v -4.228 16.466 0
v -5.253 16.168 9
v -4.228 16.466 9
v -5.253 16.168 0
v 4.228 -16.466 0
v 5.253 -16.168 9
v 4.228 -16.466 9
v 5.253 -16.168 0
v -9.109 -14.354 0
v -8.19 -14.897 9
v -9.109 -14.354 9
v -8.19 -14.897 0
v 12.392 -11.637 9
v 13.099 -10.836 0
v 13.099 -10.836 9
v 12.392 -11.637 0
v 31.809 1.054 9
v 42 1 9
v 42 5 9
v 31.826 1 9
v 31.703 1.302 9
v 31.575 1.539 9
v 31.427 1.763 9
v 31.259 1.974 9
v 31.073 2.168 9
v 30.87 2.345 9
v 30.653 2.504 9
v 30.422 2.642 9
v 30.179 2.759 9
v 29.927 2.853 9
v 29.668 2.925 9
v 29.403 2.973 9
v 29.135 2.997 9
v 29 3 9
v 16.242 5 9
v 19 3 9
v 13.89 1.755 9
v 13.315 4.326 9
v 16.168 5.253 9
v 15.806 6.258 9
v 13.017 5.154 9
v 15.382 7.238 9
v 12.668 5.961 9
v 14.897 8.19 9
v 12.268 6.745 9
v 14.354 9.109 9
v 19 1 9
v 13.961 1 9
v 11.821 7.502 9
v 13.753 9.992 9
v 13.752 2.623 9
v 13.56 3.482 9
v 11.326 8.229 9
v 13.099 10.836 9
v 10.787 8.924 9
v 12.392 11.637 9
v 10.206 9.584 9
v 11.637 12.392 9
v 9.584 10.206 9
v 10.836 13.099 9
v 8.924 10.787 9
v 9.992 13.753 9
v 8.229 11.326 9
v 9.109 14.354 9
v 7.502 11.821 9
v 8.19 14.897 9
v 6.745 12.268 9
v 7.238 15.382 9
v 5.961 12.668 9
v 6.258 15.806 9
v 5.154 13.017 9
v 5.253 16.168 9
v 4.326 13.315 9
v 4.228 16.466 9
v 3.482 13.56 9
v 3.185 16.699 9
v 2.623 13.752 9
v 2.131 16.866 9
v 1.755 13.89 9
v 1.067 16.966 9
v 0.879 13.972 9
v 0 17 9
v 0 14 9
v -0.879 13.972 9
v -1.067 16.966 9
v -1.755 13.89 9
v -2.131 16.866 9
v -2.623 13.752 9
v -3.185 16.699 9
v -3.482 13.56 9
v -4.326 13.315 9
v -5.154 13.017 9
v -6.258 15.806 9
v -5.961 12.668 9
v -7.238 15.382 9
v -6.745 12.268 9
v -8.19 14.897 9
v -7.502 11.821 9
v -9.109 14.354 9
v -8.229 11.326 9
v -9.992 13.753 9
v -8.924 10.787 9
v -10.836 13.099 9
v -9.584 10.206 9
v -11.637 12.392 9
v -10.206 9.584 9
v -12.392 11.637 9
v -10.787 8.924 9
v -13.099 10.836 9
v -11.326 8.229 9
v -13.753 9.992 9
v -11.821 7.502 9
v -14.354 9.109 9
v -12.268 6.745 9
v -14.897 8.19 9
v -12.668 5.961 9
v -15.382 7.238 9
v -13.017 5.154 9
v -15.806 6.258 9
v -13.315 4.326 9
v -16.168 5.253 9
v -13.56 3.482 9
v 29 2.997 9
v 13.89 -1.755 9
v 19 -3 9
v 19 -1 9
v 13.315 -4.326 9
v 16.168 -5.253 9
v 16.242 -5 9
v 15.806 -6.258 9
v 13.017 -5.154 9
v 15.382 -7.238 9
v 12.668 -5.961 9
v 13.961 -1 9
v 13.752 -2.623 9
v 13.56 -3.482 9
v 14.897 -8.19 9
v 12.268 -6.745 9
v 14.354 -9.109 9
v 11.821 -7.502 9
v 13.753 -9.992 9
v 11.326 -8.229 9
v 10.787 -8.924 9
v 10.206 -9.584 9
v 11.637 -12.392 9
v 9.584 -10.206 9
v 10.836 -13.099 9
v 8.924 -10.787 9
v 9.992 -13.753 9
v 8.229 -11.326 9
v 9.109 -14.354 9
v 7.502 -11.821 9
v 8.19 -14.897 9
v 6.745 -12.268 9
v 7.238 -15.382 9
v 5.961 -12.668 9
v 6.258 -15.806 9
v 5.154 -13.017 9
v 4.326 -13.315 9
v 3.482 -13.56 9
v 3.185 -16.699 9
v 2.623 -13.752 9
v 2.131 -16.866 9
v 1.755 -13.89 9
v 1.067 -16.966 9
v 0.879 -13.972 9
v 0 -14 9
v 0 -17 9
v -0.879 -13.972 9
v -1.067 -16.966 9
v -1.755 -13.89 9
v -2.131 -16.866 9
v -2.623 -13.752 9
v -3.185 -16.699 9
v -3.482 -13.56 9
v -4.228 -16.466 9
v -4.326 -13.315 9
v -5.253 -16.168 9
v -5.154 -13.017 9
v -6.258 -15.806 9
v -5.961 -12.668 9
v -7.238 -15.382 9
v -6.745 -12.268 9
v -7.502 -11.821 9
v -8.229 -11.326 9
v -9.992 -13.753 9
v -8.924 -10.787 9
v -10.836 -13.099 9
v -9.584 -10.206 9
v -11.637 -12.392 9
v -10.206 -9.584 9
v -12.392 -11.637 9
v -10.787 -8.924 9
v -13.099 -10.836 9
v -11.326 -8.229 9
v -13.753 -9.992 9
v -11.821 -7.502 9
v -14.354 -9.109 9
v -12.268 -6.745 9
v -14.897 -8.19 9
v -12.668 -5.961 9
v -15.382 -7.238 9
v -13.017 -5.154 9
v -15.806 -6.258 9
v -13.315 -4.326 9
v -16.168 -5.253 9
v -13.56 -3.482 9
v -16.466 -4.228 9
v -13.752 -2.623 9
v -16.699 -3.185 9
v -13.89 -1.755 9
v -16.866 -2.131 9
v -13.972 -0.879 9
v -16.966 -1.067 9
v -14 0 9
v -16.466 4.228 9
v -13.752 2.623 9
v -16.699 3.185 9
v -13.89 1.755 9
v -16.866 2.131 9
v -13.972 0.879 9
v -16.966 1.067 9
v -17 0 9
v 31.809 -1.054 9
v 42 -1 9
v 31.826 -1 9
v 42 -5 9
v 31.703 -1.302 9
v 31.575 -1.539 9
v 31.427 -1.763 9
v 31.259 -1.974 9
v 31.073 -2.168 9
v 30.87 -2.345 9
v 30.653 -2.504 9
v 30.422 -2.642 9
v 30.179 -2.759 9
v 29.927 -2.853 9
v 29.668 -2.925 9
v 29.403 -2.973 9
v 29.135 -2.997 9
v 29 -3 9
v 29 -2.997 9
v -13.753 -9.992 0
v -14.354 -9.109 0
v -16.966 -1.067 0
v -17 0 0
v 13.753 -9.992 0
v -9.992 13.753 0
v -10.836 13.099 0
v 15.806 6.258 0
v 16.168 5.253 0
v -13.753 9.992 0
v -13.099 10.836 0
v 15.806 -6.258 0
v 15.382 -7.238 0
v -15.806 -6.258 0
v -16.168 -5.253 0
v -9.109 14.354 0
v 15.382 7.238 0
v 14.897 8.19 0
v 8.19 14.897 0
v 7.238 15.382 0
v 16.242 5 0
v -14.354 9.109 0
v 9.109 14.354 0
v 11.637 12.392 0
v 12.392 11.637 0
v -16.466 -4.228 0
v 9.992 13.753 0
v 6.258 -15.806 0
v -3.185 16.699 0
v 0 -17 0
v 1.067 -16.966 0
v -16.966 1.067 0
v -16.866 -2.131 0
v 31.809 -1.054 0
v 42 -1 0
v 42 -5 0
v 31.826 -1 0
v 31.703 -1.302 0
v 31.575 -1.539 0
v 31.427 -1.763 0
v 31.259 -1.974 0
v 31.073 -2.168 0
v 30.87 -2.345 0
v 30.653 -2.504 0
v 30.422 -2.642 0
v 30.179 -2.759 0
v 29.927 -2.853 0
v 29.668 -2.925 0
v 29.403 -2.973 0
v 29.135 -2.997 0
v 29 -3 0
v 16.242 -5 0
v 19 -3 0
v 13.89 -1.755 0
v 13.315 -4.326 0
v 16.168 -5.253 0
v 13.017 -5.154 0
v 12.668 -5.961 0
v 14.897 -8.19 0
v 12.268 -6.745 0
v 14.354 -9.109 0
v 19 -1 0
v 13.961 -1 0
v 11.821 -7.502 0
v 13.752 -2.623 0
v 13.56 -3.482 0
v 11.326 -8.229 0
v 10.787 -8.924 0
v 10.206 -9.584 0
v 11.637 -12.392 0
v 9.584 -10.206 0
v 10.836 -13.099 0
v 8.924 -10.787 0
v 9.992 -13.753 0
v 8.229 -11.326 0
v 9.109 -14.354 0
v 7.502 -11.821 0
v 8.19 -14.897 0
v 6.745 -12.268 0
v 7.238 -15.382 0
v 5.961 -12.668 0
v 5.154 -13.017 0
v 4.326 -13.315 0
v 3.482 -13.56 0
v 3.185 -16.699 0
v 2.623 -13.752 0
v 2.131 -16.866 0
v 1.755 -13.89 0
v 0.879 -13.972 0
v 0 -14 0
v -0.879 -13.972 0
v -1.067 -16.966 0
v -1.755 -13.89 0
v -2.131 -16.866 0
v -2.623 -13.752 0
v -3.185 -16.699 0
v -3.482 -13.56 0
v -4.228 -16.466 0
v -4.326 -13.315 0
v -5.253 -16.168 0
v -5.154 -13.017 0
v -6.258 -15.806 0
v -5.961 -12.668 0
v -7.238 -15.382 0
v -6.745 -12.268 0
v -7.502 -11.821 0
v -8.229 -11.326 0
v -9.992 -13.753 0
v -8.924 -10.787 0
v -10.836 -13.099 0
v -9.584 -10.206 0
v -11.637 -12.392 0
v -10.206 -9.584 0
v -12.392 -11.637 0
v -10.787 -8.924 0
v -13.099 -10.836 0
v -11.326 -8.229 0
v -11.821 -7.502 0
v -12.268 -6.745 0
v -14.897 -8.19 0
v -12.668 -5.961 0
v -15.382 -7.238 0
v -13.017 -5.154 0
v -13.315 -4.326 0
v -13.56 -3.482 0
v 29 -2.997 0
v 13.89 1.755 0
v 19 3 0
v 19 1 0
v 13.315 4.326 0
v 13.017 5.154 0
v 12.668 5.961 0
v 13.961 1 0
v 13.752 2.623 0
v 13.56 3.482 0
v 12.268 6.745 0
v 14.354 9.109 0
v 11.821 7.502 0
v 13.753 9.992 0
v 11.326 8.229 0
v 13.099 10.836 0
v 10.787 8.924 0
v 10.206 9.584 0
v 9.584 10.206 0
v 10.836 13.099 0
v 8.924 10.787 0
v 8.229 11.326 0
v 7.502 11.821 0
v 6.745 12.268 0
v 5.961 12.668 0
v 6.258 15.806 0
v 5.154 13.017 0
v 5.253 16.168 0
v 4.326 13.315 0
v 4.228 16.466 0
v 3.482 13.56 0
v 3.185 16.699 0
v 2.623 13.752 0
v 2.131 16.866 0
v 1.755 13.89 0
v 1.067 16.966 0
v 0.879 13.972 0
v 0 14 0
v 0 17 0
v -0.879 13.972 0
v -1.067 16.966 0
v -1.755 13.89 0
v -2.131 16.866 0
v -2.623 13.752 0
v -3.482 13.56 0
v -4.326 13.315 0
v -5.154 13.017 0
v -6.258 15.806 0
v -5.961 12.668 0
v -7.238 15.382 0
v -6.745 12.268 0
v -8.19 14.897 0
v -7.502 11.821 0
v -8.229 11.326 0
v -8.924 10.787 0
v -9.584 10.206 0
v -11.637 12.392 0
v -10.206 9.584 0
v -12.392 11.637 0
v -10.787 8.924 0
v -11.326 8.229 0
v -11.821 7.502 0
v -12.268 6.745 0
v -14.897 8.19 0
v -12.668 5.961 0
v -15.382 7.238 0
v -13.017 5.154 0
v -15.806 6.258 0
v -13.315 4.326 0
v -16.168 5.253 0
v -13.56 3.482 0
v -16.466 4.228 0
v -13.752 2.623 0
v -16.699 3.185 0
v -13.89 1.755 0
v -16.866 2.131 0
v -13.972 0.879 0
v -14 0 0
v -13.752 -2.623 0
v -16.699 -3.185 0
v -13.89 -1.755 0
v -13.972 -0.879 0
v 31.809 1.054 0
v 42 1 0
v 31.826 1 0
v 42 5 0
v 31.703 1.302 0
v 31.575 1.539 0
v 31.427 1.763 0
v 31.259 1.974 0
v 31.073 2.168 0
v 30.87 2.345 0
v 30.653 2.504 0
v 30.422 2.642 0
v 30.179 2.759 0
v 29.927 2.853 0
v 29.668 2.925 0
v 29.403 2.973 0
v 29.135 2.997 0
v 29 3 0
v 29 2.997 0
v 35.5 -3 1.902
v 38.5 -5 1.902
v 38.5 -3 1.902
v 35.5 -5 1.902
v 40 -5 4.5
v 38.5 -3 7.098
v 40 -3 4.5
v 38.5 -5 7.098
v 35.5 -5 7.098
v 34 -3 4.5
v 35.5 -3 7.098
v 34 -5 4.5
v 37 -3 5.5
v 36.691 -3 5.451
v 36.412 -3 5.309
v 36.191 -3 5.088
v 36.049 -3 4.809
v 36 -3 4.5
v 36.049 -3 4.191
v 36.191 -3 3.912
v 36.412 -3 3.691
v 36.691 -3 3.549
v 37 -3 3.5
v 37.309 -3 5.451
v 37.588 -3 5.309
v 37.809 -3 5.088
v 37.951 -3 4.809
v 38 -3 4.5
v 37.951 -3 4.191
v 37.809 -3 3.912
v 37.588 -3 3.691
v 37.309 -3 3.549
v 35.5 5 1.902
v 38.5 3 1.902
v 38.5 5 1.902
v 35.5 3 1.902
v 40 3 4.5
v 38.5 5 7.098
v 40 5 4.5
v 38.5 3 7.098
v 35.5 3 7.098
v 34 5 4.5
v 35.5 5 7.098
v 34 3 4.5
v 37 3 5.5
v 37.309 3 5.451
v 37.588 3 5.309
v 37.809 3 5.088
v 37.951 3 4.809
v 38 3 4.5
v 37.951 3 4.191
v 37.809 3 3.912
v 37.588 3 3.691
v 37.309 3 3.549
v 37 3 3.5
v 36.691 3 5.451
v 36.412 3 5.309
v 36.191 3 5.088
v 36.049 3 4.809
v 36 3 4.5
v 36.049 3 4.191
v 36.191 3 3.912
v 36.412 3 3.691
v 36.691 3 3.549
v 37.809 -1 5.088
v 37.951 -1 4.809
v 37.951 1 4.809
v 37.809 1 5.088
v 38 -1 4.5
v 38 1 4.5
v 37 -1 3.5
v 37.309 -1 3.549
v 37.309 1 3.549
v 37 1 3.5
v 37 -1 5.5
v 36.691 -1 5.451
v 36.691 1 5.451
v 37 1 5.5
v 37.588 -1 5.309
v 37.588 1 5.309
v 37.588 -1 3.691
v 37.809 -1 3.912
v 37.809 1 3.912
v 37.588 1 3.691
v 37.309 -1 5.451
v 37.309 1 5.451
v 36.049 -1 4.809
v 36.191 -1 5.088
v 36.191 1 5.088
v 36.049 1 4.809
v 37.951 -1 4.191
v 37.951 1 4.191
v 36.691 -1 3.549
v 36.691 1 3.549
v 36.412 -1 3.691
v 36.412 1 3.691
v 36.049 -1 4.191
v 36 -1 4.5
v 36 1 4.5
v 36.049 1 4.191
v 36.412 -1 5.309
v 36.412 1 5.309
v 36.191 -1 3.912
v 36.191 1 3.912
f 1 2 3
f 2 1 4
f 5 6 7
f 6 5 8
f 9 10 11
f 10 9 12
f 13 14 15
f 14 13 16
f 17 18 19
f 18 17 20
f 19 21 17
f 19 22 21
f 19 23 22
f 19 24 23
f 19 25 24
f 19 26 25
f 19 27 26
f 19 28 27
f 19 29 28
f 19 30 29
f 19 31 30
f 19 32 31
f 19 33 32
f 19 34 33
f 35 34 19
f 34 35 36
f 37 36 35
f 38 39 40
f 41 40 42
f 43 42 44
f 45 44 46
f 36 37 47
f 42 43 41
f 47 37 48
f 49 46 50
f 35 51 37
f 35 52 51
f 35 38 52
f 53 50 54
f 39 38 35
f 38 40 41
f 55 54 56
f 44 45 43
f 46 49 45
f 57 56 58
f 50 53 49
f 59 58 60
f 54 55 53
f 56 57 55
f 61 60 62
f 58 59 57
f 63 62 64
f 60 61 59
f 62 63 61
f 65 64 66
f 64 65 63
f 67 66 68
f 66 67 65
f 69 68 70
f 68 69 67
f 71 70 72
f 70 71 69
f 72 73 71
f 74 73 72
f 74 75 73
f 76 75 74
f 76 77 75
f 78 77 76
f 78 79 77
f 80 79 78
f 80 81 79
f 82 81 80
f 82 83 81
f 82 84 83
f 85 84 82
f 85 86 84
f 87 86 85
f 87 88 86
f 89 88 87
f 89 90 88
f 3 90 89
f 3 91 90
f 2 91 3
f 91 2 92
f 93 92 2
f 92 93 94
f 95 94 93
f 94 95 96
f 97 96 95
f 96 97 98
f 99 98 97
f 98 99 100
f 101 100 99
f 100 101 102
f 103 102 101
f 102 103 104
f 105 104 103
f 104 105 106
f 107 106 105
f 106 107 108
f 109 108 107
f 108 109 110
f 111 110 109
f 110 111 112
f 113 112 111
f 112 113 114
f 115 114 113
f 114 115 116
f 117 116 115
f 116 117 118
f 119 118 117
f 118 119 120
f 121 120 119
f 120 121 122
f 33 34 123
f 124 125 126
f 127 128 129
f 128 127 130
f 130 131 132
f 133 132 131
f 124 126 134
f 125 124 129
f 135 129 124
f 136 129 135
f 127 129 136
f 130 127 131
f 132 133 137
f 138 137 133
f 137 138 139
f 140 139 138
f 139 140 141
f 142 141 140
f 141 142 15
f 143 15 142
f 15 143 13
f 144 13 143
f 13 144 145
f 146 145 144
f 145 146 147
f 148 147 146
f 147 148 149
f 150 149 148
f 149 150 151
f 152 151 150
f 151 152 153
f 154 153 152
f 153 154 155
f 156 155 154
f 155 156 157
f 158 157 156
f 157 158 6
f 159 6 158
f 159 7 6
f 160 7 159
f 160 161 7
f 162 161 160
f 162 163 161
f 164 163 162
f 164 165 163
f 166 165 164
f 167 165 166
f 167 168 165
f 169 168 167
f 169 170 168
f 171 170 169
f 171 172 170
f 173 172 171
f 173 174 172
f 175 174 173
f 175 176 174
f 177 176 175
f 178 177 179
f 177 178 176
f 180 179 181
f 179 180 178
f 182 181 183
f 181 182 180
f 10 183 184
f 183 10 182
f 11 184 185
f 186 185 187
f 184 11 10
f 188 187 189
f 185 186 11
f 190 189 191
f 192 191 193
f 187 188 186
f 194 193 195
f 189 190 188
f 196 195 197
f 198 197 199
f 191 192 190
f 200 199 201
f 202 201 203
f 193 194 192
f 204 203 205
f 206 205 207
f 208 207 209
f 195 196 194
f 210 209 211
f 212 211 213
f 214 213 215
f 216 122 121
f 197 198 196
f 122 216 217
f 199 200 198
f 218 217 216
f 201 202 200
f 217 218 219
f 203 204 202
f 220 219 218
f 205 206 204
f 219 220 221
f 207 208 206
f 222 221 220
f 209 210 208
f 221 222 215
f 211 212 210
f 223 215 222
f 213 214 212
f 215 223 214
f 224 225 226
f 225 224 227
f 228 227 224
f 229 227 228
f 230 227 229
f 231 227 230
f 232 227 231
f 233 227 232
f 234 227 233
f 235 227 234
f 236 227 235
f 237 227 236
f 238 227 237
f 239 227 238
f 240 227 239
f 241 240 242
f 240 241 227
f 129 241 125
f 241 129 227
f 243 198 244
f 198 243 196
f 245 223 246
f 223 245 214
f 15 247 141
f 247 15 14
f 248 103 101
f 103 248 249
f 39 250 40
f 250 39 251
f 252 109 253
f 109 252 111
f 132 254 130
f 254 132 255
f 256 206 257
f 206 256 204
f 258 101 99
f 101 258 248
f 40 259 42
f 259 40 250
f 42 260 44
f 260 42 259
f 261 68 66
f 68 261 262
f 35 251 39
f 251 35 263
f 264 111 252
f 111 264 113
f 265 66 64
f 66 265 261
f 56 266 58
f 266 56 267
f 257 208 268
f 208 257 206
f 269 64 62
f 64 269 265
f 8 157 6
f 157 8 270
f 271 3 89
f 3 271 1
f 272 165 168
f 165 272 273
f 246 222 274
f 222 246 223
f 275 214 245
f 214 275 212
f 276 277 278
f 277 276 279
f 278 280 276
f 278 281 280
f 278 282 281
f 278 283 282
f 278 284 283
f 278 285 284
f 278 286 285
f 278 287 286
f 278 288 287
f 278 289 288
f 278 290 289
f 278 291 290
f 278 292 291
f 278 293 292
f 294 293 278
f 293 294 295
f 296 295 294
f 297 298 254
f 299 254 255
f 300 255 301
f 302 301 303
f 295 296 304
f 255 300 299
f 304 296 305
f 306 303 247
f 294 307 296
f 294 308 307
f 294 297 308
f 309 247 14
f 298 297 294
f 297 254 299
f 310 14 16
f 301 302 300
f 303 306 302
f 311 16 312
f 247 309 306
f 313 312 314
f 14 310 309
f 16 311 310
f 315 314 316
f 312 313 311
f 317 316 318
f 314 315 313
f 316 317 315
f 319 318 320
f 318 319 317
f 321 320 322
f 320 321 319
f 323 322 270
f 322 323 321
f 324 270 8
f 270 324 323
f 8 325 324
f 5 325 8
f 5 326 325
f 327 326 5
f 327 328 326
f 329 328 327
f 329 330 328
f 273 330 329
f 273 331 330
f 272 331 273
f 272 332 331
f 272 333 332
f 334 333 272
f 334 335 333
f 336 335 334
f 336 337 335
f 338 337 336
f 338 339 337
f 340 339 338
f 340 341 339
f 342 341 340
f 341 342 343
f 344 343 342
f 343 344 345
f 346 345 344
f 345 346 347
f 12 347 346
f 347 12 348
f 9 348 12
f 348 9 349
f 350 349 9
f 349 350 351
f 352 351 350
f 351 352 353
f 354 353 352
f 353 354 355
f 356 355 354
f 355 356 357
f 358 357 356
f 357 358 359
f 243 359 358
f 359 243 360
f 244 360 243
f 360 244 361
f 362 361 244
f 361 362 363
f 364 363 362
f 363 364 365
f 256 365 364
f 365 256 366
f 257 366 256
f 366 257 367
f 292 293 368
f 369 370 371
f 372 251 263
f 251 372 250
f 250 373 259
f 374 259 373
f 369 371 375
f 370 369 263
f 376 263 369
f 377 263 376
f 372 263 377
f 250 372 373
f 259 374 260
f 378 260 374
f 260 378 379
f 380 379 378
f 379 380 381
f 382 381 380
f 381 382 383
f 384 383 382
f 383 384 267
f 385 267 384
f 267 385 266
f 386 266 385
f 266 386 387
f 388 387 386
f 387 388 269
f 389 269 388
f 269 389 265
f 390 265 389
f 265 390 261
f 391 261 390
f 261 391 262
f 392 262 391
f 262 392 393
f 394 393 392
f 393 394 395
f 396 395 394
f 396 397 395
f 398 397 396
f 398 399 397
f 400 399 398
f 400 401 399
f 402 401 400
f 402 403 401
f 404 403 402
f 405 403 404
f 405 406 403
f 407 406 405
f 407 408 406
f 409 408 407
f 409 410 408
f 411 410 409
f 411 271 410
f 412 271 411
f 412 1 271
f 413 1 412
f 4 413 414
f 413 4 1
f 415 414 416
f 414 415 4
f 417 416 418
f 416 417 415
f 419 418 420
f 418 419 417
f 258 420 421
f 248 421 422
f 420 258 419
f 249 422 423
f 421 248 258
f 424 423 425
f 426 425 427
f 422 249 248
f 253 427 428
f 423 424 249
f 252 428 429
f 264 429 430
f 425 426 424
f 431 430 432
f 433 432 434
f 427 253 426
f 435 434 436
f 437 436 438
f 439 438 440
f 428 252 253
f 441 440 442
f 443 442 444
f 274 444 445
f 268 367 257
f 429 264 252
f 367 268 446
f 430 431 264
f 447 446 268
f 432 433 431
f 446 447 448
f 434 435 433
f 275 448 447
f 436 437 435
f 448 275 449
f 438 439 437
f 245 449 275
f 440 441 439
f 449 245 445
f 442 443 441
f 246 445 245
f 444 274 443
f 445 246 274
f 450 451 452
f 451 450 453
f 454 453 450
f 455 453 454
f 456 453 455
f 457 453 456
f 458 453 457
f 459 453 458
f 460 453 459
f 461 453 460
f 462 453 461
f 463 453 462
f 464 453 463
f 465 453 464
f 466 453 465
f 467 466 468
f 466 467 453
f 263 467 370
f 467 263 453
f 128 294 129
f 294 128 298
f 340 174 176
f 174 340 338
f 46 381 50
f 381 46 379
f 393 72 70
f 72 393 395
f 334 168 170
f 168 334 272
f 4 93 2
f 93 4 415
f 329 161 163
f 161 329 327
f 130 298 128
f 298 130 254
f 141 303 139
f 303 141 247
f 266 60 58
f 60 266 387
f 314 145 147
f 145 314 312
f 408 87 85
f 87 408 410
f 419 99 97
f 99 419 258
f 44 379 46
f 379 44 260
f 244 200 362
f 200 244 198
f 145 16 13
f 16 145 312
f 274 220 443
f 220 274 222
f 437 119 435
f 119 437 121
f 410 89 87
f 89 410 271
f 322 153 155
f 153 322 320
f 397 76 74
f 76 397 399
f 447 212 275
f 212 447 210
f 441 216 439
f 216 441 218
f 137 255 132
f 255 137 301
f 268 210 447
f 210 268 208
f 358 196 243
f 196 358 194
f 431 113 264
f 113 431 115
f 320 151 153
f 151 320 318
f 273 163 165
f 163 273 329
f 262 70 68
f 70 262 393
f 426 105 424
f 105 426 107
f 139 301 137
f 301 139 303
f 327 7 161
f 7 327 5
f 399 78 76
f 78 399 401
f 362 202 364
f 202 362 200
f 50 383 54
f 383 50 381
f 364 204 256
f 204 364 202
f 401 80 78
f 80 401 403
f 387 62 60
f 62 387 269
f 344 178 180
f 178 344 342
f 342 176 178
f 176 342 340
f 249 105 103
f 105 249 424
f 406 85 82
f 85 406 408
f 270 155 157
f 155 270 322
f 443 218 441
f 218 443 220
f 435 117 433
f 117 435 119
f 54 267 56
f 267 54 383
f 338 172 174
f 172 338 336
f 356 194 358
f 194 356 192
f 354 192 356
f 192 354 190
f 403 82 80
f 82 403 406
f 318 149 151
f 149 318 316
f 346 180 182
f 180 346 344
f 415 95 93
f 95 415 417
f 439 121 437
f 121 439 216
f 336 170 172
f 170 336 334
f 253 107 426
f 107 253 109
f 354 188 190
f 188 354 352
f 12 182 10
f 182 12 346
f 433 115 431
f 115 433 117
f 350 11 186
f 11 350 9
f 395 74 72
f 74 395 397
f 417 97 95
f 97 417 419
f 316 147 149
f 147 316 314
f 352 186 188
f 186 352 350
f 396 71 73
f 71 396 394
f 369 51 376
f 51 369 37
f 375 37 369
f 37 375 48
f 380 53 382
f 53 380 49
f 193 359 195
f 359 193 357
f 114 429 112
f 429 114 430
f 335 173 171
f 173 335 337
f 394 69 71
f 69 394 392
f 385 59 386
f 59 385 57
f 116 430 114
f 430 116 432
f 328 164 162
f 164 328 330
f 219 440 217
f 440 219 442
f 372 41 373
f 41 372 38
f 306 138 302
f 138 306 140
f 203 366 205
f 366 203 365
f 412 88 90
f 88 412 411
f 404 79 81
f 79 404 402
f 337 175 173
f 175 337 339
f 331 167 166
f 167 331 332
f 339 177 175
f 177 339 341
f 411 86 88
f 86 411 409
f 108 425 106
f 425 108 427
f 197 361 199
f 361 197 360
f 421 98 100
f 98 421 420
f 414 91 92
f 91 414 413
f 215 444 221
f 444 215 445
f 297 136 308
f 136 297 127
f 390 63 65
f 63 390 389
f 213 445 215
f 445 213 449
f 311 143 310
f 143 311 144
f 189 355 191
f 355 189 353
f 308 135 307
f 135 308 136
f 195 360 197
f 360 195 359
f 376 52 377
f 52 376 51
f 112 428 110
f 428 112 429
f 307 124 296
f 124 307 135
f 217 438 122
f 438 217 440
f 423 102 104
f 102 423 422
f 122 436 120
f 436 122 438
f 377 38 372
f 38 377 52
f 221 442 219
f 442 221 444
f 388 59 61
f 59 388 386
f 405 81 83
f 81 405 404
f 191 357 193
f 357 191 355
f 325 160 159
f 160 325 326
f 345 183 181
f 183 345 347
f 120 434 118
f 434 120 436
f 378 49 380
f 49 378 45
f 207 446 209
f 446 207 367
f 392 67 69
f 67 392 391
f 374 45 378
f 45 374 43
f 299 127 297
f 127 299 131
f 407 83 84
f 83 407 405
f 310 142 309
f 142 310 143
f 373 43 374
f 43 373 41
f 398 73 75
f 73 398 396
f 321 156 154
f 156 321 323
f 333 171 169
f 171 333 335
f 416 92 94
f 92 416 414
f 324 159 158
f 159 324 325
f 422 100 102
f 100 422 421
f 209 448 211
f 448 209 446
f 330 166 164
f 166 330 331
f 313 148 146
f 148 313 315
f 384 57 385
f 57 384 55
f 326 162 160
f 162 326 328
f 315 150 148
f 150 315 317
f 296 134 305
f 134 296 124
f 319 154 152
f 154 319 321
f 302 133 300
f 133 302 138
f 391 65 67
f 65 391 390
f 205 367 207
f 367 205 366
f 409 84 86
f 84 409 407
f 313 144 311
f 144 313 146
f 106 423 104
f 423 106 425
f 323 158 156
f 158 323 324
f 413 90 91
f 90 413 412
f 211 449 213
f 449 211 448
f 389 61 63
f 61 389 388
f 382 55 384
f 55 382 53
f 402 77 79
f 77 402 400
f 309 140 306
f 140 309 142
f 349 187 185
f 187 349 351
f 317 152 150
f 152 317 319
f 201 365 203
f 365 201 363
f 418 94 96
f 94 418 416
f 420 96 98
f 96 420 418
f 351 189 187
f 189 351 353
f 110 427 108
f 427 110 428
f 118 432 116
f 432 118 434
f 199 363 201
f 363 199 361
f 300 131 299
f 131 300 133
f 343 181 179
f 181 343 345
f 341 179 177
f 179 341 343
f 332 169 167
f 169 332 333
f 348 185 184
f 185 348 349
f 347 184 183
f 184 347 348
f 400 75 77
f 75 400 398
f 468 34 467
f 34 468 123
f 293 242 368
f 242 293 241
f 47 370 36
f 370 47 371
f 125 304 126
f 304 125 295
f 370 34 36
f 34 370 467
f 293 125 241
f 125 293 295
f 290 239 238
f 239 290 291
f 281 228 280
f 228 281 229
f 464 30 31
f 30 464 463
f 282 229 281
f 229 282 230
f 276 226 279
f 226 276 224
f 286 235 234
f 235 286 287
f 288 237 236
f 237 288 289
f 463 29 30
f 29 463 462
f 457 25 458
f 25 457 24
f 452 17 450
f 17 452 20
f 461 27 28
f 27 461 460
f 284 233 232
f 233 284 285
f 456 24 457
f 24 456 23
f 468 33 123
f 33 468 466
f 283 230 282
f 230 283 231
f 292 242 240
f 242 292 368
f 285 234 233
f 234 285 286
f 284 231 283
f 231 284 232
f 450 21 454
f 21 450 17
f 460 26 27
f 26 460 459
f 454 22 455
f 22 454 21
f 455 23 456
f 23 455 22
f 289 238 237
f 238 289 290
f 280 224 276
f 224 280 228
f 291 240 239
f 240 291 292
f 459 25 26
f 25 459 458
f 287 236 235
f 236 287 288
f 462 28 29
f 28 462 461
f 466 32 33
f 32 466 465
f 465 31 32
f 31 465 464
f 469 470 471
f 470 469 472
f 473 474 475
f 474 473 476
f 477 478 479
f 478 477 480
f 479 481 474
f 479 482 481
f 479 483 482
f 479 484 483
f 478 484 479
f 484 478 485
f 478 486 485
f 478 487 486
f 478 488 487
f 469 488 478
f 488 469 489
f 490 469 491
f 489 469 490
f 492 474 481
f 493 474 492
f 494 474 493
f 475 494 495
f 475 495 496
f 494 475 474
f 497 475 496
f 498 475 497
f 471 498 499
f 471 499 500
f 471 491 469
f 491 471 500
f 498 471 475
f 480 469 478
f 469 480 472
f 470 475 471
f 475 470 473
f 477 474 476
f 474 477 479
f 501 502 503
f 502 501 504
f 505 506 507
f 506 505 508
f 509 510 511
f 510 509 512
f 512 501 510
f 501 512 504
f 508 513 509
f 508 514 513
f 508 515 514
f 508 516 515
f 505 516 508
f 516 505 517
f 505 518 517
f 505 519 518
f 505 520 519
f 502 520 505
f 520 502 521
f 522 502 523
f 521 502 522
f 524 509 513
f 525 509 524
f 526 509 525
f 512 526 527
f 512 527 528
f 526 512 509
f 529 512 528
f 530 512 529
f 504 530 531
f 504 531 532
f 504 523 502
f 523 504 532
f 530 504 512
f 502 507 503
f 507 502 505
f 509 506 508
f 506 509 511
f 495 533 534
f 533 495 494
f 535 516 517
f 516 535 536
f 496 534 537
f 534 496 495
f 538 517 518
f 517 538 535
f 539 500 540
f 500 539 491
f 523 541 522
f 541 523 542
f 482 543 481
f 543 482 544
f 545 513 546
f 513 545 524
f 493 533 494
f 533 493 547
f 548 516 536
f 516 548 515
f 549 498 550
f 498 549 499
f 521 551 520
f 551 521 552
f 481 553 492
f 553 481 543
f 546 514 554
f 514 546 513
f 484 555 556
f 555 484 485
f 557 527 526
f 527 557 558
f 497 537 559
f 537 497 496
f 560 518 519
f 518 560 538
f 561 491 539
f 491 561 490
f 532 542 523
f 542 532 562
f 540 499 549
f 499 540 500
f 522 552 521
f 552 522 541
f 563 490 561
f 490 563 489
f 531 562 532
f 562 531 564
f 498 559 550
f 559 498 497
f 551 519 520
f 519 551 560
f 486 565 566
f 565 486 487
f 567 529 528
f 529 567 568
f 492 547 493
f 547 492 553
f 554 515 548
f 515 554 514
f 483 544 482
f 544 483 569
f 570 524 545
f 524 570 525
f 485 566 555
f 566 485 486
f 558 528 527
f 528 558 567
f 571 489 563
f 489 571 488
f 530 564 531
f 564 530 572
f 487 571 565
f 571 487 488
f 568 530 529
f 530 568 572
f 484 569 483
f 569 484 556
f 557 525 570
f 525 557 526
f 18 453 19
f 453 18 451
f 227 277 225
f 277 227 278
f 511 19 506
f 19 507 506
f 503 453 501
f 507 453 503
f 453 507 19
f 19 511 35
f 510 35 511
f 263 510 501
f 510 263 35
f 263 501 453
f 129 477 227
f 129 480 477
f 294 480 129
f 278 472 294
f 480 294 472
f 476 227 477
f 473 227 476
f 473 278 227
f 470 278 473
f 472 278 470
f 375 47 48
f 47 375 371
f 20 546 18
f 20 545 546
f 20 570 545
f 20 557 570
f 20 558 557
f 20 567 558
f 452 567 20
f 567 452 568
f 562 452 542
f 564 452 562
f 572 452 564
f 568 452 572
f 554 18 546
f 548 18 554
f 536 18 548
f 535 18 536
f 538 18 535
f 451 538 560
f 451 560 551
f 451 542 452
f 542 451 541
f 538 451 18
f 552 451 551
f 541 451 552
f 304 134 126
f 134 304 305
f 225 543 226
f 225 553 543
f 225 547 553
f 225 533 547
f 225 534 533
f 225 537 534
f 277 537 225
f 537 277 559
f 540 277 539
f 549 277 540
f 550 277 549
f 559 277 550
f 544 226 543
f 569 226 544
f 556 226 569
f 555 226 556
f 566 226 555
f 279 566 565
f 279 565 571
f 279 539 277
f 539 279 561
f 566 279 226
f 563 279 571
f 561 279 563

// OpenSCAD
// file: ../../clasp/neon-like-strip-clasp.scad
use <../led-strip/led-strip.scad>;

module stripClasp(claspThickness = 4,
                  xLength = 88,
                  claspLength = 15)
{
    claspWidth = neonLikeLedStrip_width() + claspThickness; 
 
    union()
    {
        stripClasp_main(xLength = xLength,
                        claspLength = claspLength,
                        claspThickness = claspThickness,
                        claspWidth = claspWidth
                        );
    }
} 

module stripClasp_main(xLength,
                        claspLength,
                        claspThickness,
                        claspWidth)
{
    difference()
    {
        cube([xLength, claspWidth, claspLength ]);
 
        yTranslate = neonLikeLedStrip_width() / 2.0 - 1;
        xTranslate = 2;
        color("lime")
        translate([xTranslate, yTranslate, -0.01])
        neonLikeLedStrip(length = 20);

        stripClasp_screwHolder(claspLength = claspLength,
                               xLength = xLength);
    }
}
 
module stripClasp_screwHolder(claspLength, xLength)
{
    // bolt recess x2
    boltRecesRadius = 3;
    xTranslate = xLength - 5;
    yTranslate = claspLength / 2.0 ;
    zTranslate = -2;  //-15;    
    rotate([90,0,0])
    translate([xTranslate, yTranslate, zTranslate])
    color("blue")
    cylinder(r=boltRecesRadius, h=5, $fn = 6);

    zTranslate_second = -claspLength  - 4;
    rotate([90,0,0])
    translate([xTranslate, yTranslate, zTranslate_second])
    color("grey")
    cylinder(r=boltRecesRadius, h=5, $fn = 6);


    // bolt hole
    rotate([90,0,0])
    translate([xTranslate, yTranslate, zTranslate_second])
    color("green")
    cylinder(r=1, h=15, $fn = 20);
}
// file: ../../led-strip/led-strip.scad
function neonLikeLedStrip_width() = 6;

function neonLikeLedStrip_height() = 13;

module neonLikeLedStrip(length = 10)
{
    union()
    {
        radius = neonLikeLedStrip_width() / 2.0;

        cubeX = neonLikeLedStrip_height() - radius;

        cubeY = neonLikeLedStrip_width();

        color("white")
        cube([cubeX, cubeY, length]);
    
        color("green")
        translate([cubeX, radius, 0])
        cylinder(r = radius, h= length, $fn = 70);
    }
}
// file: ../../../../../../../shapes/open-cylinder/open-cylinder.scad
// TODO: Lower this to 50.
module openCylinder(height = 3,
                    outerRadius = 7,
                    innerRadius = 4.5,
                    fn = 100)
{
    $fn = fn;

    difference()
    {
        cylinder(r=outerRadius,
                 h=height);

        translate([0, 0, -1])
        cylinder(r=innerRadius,
                 h=height+1.01);
    }
}
// file: ../../neon-like-led-strip-pipe-fastener.scad
use <../../../../../shapes/open-cylinder/open-cylinder.scad>

use <led-strip/led-strip.scad>;
use <clasp/neon-like-strip-clasp.scad>;

module neonLikeLedStripPipeFastener(fastenerHeight = 9,
                                    fastenerThickness = 8,
                                    innerRadius = 33,
                                    ledStripLength = 300,
                                    showLedStrip = false)
{
    difference()
    {
        neonLikeLedStripPipeFastenerSolid(fastenerHeight = fastenerHeight,
                                         fastenerThickness = fastenerThickness,
                                         innerRadius = innerRadius,
                                         ledStripLength = ledStripLength,
                                         showLedStrip = showLedStrip);

        width = 2;
        yTranslate = -width / 2.0;
        translate([0, yTranslate, -0.01])
        cube([100, width, 25]);
    }
}

module neonLikeLedStripPipeFastenerSolid(fastenerHeight,
                                    fastenerThickness,
                                    innerRadius,
                                    ledStripLength,
                                    showLedStrip)
{
    union()
    {
        if(showLedStrip)
        {
            xTranslate = innerRadius + fastenerThickness;
            yTranslate = 0;
            zTranslate = -ledStripLength / 2.0;
            translate([xTranslate, yTranslate, zTranslate])
            neonLikeLedStrip(length = ledStripLength);
        }

        pipeFastener(fastenerThickness = fastenerThickness,
                     height = fastenerHeight,
                     innerRadius = innerRadius
                     );
   
        stipFastener(height = fastenerHeight,
                     fastenerThickness = fastenerThickness,
                     innerRadius = innerRadius);
    }    
}

module pipeFastener(fastenerThickness = 5,
                    height = 9,
                    innerRadius = 10)
{
    outerRadius = innerRadius + fastenerThickness;

    openCylinder(height = height,
                innerRadius = innerRadius,
                outerRadius = outerRadius);
}

module stipFastener(fastenerThickness = 2,
                    height = 10,
                    innerRadius = 1) 
{
    // attacherator
    attacheratorLength_x = 2;
    attacheratorLength_y = neonLikeLedStrip_width() + fastenerThickness + 1;
    attacheratorTranslate_x = fastenerThickness + innerRadius -1;
    attacheratorTranslate_y = -attacheratorLength_y / 2.0;
    color("purple")
    translate([attacheratorTranslate_x, attacheratorTranslate_y, 0])
    cube([attacheratorLength_x, attacheratorLength_y, height]);

    claspThickness = 4;
    xTranslate = innerRadius + fastenerThickness;
    yTranslate = -(neonLikeLedStrip_width() + claspThickness) / 2.0;
    translate([xTranslate, yTranslate, 0])
    stripClasp(claspThickness = claspThickness,
               xLength = height + 8 + 8,
               claspLength = height);
}
// main file
use <../../neon-like-led-strip-pipe-fastener.scad>

neonLikeLedStripPipeFastener(fastenerHeight = 9,
                             fastenerThickness = 3,
                             innerRadius = 14,
                             ledStripLength = 50
//                             ,
//                             showLedStrip = true
                             );
